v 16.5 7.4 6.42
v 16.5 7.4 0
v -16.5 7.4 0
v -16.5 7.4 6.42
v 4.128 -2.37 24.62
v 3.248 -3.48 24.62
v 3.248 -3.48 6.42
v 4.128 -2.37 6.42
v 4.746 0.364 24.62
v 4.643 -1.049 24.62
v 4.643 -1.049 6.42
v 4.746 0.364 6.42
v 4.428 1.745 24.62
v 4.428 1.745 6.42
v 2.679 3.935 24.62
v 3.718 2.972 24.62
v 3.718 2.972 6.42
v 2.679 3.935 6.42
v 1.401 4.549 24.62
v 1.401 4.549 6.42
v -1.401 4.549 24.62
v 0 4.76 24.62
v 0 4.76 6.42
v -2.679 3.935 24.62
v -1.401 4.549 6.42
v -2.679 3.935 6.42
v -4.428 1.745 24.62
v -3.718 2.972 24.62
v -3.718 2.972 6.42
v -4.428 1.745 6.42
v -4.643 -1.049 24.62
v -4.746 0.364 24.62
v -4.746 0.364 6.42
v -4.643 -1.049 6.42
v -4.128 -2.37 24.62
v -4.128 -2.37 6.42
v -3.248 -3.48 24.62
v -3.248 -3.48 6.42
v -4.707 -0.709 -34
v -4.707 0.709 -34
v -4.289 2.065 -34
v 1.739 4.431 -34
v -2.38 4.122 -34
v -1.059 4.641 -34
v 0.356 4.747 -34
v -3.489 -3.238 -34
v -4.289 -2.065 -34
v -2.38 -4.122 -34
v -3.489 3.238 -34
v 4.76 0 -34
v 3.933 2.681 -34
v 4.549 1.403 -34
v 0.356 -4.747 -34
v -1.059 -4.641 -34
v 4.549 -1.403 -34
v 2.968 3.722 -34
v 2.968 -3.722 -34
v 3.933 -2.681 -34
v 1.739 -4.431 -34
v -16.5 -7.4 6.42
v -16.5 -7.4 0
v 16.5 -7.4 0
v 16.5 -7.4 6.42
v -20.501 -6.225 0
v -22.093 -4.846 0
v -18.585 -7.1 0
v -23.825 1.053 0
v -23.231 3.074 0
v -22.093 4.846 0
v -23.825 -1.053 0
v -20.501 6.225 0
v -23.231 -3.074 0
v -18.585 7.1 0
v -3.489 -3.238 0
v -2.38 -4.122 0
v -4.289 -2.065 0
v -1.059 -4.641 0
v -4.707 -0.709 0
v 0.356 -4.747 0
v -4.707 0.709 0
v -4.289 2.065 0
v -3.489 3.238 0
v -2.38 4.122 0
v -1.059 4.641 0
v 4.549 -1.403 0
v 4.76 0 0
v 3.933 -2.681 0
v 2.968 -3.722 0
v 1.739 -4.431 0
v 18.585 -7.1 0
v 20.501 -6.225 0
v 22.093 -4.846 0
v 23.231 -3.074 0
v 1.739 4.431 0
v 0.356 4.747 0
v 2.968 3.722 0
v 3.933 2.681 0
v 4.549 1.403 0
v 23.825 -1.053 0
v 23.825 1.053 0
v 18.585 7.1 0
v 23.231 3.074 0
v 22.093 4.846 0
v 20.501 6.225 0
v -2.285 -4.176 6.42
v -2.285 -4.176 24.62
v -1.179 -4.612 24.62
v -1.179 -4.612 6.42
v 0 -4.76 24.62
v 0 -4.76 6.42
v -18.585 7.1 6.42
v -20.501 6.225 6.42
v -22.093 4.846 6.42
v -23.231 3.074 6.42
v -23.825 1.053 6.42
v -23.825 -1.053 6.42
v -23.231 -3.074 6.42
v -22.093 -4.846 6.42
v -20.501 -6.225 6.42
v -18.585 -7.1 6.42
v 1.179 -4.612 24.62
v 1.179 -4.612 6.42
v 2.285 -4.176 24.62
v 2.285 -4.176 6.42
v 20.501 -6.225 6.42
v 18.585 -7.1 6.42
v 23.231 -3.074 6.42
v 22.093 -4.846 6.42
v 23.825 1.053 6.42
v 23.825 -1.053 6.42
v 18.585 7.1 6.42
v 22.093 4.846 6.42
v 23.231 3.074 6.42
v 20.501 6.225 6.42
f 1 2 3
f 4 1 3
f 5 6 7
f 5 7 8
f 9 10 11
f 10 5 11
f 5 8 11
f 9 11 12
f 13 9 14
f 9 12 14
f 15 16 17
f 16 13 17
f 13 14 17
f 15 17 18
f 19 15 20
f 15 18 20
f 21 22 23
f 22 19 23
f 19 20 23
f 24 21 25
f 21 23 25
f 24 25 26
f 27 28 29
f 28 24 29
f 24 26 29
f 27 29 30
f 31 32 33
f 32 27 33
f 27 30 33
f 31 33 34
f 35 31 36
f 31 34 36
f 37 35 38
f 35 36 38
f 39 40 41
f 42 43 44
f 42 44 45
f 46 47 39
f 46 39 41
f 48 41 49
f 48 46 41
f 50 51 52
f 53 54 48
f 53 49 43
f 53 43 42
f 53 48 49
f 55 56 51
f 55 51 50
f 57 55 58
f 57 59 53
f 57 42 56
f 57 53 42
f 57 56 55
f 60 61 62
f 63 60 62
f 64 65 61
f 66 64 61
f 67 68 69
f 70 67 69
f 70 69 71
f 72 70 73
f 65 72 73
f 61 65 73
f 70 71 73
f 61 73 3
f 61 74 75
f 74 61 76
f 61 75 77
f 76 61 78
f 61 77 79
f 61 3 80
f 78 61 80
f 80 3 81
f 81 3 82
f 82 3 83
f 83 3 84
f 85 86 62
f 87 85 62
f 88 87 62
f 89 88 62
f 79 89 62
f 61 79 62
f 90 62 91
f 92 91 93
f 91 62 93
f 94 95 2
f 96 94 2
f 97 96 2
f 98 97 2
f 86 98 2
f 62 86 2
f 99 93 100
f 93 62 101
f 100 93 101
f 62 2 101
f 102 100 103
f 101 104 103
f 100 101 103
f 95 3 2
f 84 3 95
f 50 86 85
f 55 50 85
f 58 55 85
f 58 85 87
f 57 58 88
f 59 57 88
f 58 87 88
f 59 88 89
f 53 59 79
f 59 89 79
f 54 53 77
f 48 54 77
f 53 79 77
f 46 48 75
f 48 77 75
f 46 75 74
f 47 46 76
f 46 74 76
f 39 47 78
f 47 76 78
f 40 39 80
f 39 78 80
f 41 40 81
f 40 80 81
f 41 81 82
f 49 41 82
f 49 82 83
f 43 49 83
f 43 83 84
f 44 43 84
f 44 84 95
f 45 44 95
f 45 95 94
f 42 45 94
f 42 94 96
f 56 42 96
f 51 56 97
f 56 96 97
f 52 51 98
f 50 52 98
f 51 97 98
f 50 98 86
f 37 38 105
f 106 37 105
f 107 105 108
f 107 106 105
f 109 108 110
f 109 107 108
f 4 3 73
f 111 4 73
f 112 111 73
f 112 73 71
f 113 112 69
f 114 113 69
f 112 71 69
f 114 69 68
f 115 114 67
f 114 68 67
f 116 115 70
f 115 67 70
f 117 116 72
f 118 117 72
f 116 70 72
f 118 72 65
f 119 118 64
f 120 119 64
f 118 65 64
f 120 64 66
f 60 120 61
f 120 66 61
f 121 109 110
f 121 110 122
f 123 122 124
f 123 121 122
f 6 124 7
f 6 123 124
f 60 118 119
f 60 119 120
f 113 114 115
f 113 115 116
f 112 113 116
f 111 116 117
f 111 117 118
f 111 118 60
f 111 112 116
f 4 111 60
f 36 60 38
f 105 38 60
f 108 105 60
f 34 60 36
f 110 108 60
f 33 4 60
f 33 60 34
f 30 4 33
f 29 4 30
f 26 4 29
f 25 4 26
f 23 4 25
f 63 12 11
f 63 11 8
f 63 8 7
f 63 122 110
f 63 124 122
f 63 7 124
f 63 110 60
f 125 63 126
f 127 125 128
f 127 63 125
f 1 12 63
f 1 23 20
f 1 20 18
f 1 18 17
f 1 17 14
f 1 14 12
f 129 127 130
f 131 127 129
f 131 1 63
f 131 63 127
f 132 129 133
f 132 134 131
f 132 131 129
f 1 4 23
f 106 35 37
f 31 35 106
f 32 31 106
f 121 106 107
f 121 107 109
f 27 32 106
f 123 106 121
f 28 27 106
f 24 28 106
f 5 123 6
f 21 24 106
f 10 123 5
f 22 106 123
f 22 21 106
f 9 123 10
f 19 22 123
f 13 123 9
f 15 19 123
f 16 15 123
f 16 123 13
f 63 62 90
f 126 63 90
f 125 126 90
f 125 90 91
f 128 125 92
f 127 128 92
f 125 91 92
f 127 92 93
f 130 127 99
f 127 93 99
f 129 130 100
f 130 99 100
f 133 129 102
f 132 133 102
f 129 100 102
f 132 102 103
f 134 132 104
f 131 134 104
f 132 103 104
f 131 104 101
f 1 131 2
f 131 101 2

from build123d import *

# Parameters (mm, degrees)
F1_DEPTH = 6.42
F2_R     = 4.76
F3_DEPTH = 34
F4_R     = 4.76
F5_DEPTH = 18.2
F7_DEPTH = 18.2


with BuildPart() as f1:
    # F0 (on Top) → F1 (new body)
    with BuildSketch(Plane.XY):
        with BuildLine():
            Line((16.5, 7.4), (-16.5, 7.4))
            ThreePointArc((-16.5, 7.4), (-23.9, 0), (-16.5, -7.4))
            Line((-16.5, -7.4), (16.5, -7.4))
            ThreePointArc((16.5, -7.4), (23.9, 0), (16.5, 7.4))
        make_face()
    extrude(amount=F1_DEPTH)

    # F2 (on face) → F3 (join)
    with BuildSketch(Plane(origin=(0, 0, 0), x_dir=(1, 0, 0), z_dir=(0, 0, -1))):
        Circle(F2_R)
    extrude(amount=F3_DEPTH)

    # F4 (on face) → F5 (join)
    with BuildSketch(Plane.XY.offset(6.42)):
        Circle(F4_R)
    extrude(amount=F5_DEPTH)

    # F6 (on face) → F7 (join)
    with BuildSketch(Plane.XY.offset(24.62)):
        with BuildLine():
            ThreePointArc((-3.247645, -3.48), (-1.745394, -4.428453), (0, -4.76))
            Line((0, -4.76), (0, -3.48))
            Line((0, -3.48), (-3.247645, -3.48))
        make_face()
        with BuildLine():
            Line((0, -3.48), (0, -4.76))
            ThreePointArc((0, -4.76), (1.745394, -4.428453), (3.247645, -3.48))
            Line((3.247645, -3.48), (0, -3.48))
        make_face()
    extrude(amount=-F7_DEPTH)


solid = f1.part
